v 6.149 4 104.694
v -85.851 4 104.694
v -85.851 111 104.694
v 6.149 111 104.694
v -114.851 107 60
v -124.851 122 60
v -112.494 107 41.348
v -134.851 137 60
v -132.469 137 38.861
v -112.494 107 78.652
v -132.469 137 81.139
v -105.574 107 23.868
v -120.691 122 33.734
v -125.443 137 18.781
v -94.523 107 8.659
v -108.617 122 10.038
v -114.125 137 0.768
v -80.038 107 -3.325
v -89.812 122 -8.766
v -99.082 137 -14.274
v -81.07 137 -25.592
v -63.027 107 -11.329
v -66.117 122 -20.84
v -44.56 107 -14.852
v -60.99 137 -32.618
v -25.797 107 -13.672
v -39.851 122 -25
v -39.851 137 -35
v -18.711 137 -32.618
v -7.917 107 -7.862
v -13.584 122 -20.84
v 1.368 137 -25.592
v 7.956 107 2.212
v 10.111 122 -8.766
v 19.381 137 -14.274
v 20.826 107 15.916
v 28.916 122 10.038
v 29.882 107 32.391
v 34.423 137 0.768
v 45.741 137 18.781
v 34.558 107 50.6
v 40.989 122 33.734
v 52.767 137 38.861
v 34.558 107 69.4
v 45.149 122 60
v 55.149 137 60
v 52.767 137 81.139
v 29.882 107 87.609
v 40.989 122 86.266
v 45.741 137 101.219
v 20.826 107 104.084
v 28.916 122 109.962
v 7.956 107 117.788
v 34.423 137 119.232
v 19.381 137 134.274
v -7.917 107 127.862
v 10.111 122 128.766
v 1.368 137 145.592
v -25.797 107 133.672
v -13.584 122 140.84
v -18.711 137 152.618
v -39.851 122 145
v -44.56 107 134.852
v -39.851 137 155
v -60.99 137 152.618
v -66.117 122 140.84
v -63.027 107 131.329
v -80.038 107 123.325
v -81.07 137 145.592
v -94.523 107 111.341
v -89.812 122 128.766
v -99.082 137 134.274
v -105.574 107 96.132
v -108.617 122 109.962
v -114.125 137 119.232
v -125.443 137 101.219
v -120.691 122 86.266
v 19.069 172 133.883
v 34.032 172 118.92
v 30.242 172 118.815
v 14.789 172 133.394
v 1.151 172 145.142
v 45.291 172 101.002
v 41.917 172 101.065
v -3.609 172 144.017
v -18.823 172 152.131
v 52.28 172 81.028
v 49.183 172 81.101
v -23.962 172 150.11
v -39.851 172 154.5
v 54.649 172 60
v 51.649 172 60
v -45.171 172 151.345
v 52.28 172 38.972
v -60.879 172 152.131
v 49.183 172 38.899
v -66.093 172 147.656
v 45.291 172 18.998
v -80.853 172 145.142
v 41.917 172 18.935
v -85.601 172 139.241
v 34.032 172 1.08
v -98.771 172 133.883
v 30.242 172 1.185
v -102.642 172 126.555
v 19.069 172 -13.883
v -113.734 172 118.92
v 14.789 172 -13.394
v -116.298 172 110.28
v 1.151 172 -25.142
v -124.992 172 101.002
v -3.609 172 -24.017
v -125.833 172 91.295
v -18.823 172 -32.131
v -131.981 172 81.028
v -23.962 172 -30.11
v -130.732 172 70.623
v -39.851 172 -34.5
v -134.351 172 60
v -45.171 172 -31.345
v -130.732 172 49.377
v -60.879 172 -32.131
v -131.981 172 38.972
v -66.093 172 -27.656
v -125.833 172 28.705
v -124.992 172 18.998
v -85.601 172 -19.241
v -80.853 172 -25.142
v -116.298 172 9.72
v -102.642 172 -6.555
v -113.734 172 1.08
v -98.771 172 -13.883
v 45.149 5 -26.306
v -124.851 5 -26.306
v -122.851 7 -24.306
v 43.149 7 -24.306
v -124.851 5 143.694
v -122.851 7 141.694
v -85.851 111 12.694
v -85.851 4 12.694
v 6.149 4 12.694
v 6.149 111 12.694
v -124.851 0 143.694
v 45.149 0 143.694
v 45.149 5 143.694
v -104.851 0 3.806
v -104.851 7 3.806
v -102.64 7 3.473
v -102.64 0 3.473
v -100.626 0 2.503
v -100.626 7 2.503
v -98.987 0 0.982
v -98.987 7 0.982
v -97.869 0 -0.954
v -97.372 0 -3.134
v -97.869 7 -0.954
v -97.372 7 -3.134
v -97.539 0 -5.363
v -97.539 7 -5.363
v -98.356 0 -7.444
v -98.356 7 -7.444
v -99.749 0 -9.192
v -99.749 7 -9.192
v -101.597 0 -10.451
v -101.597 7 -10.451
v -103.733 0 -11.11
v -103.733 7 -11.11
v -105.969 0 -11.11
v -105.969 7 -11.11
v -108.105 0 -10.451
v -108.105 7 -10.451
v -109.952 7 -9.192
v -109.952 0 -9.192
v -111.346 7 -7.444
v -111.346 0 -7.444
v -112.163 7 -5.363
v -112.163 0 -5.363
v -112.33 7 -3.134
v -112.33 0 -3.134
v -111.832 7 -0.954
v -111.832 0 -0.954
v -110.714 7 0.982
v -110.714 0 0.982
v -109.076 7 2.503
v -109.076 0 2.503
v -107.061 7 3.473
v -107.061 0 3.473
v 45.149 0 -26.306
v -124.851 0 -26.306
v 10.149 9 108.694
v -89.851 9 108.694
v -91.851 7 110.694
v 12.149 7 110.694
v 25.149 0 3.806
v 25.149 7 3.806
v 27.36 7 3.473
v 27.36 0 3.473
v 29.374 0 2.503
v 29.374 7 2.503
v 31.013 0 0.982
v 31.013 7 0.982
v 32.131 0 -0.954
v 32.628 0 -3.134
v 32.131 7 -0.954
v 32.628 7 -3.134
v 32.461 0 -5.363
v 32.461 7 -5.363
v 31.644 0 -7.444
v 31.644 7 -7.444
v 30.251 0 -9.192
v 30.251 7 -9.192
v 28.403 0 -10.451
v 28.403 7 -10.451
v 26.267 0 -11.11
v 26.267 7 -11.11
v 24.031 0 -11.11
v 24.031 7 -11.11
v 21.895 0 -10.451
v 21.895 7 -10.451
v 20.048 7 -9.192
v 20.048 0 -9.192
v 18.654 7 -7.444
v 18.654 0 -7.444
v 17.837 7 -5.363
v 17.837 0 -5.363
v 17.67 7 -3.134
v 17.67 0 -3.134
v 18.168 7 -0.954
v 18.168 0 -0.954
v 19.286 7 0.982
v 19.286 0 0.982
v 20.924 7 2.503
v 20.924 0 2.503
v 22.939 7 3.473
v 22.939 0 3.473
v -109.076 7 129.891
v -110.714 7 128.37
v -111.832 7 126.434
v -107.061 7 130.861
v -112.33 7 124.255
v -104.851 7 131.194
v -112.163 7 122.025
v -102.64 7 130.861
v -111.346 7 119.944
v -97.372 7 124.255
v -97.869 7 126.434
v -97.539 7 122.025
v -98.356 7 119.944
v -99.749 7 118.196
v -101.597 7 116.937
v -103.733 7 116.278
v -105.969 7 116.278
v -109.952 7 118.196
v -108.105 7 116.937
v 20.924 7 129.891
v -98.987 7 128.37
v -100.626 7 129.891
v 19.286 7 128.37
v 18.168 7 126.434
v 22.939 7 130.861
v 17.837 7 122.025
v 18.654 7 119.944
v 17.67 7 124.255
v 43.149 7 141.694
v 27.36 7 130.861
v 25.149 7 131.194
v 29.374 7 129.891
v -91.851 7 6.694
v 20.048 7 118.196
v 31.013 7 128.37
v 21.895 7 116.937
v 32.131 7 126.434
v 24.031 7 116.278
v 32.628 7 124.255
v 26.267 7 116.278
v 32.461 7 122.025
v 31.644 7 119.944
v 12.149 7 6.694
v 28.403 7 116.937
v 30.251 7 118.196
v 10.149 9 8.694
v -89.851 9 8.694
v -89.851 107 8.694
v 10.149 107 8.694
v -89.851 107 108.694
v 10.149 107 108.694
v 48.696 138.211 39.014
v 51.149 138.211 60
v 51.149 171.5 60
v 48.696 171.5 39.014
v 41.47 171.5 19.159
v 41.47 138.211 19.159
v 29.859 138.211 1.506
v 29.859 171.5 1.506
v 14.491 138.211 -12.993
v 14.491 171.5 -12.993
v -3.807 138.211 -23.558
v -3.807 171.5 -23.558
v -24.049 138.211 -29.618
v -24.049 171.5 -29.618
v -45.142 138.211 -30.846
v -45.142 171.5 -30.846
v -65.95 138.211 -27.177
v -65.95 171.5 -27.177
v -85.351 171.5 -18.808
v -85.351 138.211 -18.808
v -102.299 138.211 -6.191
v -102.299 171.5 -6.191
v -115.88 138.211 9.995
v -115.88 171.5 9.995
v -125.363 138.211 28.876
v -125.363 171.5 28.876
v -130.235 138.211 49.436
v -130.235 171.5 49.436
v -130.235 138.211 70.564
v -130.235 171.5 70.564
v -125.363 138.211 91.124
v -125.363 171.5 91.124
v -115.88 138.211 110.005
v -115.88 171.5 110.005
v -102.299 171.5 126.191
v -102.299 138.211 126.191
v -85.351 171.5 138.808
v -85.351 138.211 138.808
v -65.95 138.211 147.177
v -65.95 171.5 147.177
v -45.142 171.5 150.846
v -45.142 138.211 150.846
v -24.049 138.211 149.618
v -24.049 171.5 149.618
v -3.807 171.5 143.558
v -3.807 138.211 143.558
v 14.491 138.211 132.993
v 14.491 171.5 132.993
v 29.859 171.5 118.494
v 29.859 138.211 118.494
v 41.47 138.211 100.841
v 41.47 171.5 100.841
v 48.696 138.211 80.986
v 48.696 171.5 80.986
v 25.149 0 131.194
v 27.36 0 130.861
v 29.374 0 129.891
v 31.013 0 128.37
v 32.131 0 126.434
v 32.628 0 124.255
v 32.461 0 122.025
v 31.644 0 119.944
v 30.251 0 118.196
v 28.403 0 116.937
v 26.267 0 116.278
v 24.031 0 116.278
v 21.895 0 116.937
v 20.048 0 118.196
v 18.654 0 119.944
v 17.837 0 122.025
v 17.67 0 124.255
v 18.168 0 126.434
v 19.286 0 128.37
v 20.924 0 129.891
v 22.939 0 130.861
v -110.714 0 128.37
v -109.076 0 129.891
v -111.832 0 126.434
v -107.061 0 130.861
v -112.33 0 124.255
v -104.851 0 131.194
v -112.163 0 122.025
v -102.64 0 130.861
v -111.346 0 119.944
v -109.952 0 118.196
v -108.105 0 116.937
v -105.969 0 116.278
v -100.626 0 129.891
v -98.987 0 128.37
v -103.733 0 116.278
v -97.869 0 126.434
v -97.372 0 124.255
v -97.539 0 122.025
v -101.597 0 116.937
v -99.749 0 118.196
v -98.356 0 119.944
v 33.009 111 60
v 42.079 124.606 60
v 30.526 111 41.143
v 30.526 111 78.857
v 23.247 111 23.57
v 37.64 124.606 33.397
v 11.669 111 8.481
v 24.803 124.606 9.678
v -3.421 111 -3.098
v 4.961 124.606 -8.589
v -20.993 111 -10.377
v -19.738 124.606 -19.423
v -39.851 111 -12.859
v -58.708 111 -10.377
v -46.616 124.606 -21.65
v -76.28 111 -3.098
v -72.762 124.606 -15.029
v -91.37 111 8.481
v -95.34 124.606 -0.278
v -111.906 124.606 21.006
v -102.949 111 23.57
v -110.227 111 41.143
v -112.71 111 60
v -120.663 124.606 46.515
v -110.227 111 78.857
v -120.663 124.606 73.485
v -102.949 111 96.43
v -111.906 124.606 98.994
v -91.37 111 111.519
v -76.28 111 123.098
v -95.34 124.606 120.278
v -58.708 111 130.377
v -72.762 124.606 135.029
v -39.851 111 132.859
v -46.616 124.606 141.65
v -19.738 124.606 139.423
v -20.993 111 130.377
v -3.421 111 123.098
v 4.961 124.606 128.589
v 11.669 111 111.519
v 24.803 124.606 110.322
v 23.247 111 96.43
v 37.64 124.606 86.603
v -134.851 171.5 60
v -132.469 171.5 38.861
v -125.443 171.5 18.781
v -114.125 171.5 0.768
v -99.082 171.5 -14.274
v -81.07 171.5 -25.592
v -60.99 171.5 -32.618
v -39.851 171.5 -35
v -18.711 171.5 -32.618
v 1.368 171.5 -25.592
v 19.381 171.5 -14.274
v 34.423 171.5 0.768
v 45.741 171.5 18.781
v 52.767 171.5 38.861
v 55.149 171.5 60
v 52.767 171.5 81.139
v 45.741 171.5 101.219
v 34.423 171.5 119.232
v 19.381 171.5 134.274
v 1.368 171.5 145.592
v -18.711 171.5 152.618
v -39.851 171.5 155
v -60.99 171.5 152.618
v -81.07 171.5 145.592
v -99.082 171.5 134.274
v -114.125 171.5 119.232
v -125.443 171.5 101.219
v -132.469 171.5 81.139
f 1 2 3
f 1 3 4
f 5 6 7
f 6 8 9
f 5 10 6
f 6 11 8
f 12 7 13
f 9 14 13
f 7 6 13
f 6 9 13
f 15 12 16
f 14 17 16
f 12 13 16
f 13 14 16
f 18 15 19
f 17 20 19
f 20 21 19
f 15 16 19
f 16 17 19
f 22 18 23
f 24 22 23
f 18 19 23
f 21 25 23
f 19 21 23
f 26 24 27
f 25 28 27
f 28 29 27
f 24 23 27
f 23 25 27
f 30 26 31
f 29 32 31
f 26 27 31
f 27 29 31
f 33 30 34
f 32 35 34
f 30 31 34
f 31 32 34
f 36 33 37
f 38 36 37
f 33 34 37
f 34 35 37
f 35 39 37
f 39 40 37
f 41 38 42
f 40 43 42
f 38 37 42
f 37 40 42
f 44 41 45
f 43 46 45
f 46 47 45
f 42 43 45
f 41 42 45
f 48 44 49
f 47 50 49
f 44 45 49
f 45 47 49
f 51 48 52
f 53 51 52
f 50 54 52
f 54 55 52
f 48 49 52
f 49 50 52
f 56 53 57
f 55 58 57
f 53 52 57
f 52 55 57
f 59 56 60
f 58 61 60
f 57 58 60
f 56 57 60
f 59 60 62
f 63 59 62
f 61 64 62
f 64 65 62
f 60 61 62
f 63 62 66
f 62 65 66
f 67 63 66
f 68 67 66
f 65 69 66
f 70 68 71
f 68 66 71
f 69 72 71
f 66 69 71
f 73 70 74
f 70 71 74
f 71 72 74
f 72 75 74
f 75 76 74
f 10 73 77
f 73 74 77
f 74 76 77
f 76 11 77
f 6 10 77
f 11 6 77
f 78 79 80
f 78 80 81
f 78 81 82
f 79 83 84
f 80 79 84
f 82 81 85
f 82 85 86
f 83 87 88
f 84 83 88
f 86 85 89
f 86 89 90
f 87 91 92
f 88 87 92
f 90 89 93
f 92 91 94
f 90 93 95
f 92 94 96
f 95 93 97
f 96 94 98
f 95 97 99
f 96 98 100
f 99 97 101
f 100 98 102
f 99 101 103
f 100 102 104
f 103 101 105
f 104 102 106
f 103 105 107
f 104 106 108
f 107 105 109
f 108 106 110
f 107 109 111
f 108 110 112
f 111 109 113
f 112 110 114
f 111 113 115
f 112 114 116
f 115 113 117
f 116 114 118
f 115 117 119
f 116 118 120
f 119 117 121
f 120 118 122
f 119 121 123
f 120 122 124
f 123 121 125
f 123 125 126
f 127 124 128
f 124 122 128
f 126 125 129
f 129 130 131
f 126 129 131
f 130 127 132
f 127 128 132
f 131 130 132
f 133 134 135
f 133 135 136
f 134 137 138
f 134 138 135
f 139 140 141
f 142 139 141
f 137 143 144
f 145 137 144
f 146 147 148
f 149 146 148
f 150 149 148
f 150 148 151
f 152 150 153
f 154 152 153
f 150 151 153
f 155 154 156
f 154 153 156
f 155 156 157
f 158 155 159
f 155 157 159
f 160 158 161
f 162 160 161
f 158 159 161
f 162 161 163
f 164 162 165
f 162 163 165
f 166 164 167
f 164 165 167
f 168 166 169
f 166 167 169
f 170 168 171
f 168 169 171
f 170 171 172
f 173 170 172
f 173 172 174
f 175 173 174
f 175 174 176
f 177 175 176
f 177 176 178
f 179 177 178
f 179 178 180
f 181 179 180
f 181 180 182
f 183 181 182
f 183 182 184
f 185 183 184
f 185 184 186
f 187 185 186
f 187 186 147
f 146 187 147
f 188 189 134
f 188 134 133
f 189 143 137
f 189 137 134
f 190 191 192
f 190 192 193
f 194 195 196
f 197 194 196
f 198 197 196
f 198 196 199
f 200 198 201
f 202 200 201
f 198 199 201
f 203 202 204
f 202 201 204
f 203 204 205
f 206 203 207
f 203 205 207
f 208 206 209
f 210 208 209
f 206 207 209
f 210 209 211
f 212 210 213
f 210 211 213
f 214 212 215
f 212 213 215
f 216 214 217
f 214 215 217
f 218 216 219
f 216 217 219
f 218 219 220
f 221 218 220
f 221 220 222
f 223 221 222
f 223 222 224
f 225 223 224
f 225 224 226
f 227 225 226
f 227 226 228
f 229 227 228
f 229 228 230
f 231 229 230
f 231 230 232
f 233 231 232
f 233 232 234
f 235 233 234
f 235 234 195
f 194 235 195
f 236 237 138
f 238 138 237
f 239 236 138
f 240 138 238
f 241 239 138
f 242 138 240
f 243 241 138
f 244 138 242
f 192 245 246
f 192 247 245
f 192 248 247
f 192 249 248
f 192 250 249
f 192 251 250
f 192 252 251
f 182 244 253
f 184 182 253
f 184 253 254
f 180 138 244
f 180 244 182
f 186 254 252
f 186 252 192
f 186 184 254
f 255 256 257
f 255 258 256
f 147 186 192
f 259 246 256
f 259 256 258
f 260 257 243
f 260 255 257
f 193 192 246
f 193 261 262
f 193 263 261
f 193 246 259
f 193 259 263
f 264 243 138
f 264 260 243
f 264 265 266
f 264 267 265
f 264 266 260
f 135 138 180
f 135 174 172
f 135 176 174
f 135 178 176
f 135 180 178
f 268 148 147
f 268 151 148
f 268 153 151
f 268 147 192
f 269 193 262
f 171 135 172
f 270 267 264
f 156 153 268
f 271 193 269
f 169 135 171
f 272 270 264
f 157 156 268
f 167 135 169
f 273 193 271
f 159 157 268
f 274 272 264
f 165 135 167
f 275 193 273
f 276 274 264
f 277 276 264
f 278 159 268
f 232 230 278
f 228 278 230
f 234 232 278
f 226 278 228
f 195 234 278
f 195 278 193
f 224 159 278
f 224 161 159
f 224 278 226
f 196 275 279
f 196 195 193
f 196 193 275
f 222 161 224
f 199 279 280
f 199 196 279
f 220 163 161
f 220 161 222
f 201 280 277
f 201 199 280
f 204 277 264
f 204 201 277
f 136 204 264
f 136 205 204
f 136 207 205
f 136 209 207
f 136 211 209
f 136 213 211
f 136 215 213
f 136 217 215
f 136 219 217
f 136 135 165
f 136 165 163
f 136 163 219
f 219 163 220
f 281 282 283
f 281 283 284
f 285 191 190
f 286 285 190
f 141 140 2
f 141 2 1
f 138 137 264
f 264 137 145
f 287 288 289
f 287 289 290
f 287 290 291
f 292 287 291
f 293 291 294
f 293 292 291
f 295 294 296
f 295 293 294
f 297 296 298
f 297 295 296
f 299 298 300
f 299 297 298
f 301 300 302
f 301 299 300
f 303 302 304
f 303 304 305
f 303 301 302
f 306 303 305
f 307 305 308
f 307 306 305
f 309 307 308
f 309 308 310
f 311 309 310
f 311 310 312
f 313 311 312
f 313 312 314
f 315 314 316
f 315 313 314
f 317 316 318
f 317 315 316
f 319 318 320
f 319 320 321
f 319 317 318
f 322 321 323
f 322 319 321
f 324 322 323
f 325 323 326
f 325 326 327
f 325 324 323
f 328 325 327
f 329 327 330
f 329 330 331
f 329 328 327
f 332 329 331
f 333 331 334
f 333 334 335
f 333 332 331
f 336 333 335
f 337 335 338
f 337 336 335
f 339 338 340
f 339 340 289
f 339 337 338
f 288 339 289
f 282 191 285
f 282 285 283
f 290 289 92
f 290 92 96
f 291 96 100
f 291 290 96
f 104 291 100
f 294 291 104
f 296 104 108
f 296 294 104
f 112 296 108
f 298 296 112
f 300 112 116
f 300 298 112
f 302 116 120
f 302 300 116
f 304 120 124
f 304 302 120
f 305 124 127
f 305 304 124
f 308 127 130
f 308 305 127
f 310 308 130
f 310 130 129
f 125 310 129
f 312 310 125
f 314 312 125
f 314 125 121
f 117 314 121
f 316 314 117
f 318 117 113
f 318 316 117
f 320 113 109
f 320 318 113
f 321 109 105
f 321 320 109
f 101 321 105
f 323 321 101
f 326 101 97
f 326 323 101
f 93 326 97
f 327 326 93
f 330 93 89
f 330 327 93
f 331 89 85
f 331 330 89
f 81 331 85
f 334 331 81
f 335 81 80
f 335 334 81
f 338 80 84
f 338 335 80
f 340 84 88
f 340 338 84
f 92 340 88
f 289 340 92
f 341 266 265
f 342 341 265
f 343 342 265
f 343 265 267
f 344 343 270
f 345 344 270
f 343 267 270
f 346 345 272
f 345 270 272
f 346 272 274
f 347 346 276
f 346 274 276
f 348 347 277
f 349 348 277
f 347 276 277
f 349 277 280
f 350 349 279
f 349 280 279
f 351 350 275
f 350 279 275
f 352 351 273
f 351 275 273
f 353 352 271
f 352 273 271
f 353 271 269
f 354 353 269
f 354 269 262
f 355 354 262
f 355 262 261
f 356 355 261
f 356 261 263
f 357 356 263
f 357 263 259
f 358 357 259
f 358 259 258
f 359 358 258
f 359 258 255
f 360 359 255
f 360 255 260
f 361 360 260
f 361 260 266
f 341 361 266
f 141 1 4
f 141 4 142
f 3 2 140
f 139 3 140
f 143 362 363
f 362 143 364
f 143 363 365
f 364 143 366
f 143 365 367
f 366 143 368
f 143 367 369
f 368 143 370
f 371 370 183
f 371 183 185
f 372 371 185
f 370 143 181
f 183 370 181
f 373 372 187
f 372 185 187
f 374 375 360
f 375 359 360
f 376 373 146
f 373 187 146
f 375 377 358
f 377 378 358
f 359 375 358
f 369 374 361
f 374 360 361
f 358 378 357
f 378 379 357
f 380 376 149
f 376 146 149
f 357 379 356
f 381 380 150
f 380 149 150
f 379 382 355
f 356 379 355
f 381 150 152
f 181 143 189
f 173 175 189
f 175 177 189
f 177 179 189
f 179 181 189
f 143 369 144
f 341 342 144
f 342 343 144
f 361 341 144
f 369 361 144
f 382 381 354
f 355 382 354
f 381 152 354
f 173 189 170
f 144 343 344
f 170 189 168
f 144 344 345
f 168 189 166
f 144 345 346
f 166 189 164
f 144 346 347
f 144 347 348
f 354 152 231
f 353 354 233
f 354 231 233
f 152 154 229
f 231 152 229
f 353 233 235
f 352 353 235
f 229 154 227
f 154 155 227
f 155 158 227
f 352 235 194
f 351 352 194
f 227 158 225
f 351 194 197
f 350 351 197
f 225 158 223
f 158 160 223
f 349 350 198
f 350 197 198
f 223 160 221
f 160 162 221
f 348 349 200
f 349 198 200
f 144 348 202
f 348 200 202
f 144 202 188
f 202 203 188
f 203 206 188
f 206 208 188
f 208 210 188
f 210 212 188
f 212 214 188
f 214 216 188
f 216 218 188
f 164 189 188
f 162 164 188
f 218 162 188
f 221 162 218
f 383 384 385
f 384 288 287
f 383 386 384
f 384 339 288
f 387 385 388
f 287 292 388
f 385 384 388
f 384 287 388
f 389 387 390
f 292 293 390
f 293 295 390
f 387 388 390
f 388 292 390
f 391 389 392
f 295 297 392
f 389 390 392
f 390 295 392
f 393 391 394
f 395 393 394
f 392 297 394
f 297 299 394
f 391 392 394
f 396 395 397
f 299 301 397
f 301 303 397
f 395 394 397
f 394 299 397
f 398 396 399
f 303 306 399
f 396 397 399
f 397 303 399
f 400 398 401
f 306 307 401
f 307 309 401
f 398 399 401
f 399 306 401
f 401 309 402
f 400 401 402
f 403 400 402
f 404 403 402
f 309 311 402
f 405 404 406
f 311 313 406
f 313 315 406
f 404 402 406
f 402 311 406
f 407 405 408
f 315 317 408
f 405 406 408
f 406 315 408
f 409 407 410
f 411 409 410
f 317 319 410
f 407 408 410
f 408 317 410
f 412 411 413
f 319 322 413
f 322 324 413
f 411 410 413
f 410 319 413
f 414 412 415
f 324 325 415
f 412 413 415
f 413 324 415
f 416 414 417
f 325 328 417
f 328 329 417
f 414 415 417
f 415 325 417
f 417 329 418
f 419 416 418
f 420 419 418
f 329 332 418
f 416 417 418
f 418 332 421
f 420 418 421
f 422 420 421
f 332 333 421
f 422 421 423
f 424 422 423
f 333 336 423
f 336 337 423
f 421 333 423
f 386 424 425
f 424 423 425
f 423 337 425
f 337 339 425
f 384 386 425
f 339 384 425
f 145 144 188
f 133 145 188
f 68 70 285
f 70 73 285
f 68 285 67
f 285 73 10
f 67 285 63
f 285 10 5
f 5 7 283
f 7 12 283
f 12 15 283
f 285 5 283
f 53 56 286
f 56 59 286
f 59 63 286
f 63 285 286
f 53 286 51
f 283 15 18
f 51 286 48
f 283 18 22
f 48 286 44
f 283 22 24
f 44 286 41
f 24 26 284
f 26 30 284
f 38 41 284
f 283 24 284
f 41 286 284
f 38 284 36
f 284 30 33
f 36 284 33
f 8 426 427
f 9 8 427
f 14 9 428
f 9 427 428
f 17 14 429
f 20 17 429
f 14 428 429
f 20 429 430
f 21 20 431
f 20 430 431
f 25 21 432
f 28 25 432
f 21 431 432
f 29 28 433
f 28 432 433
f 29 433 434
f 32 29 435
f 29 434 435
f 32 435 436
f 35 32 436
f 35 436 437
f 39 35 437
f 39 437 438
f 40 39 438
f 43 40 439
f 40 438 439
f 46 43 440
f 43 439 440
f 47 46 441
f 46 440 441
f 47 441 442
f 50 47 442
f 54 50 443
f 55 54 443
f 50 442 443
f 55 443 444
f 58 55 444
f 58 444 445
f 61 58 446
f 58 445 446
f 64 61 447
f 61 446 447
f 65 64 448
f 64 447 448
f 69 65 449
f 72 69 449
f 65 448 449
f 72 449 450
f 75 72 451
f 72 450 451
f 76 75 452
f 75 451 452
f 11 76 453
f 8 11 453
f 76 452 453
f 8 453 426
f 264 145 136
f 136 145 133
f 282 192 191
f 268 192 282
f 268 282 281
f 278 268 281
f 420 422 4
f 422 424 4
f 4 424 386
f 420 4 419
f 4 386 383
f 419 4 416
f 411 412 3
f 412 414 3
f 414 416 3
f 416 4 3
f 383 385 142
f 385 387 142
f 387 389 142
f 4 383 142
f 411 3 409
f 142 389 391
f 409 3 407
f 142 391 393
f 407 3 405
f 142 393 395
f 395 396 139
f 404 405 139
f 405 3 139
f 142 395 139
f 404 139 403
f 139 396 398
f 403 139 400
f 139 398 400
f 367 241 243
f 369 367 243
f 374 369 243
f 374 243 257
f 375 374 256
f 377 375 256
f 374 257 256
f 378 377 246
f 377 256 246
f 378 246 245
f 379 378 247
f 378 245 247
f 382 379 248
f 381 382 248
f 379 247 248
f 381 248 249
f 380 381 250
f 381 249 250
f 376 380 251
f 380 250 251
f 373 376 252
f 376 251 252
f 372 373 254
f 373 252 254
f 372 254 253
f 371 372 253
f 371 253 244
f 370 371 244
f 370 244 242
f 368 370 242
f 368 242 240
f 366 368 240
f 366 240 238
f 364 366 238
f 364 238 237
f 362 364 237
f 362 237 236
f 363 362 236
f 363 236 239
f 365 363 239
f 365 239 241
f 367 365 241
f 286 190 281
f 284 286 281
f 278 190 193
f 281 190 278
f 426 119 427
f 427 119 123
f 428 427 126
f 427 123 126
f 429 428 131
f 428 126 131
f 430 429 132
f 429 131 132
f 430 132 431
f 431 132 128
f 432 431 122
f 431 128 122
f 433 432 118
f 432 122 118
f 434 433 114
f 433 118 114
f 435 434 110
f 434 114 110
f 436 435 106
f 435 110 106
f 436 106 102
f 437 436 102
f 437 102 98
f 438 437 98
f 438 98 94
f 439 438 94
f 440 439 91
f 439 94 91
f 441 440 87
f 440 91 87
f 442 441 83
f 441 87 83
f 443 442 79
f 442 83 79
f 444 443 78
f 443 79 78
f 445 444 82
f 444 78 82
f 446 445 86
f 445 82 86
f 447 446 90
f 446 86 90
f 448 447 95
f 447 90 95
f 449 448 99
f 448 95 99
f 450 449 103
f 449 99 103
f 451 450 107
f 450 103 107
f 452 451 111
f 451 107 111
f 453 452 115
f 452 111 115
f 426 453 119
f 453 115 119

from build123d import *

# Parameters (mm, degrees)
ESQUISSE1_W             = 170
ESQUISSE1_H             = 170
BOSS_EXTRU_1_DEPTH      = 7
ESQUISSE2_W             = 100
ESQUISSE2_H             = 100
BOSS_EXTRU_2_DEPTH      = 100
COQUE1_START            = 4
COQUE1_OUTLINE_W        = 92
COQUE1_OUTLINE_H        = 92
COQUE1_DEPTH            = 168
COQUE1_START_2          = 138.211102451
COQUE1_2_OUTLINE_R      = 91
COQUE1_2_OUTLINE_W      = 92
COQUE1_2_OUTLINE_H      = 92
COQUE1_2_DEPTH          = 33.788897549
CHANFREIN1_SIZE         = 2
CHANFREIN2_SIZE         = 0.5
ESQUISSE4_R             = 7.5
ENL_V_MAT_EXTRU_1_DEPTH = 70


with BuildPart() as part:
    # Esquisse1 → Boss.-Extru.1 (new body)
    with BuildSketch(Plane(origin=(0, 0, 0), x_dir=(1, 0, 0), z_dir=(0, 1, 0))):
        with Locations((-39.850746269, -58.694029851)):
            Rectangle(ESQUISSE1_W, ESQUISSE1_H)
    extrude(amount=BOSS_EXTRU_1_DEPTH)

    # Esquisse2 → Boss.-Extru.2 (add)
    with BuildSketch(Plane(origin=(0, 7, 0), x_dir=(1, 0, 0), z_dir=(0, 1, 0))):
        with Locations((-39.850746269, -58.694029851)):
            Rectangle(ESQUISSE2_W, ESQUISSE2_H)
    extrude(amount=BOSS_EXTRU_2_DEPTH)

    # Esquisse3 → Révolution1 (revolve)
    with BuildSketch(Plane.XY.offset(60), mode=Mode.PRIVATE) as r_volution1_sk:
        Polygon((55.149253731, 137), (55.149253731, 172), (-39.850746269, 172), (-39.850746269, 107), (35.149253731, 107), align=None)
    revolve(r_volution1_sk.sketch.rotate(Axis((-39.850746269, 172, 60), (0, -1, 0)), 180), axis=Axis((-39.850746269, 172, 60), (0, -1, 0)))

    # Coque1: read off the stored shape, not the designer's step
    # Coque1 outline → Coque1 (cut)
    with BuildSketch(Plane(origin=(0, 0, 0), x_dir=(1, 0, 0), z_dir=(0, 1, 0)).offset(COQUE1_START)):
        with Locations((-39.850746269, -58.694029851)):
            Rectangle(COQUE1_OUTLINE_W, COQUE1_OUTLINE_H)
    extrude(amount=COQUE1_DEPTH, mode=Mode.SUBTRACT)

    # Coque1 2 outline → Coque1 2 (cut)
    with BuildSketch(Plane(origin=(0, 0, 0), x_dir=(1, 0, 0), z_dir=(0, 1, 0)).offset(COQUE1_START_2)):
        with Locations((-39.850746269, -60)):
            Circle(COQUE1_2_OUTLINE_R)
        with Locations((-39.850746269, -58.694029851)):
            Rectangle(COQUE1_2_OUTLINE_W, COQUE1_2_OUTLINE_H, mode=Mode.SUBTRACT)
    extrude(amount=COQUE1_2_DEPTH, mode=Mode.SUBTRACT)

    # Coque1 3 outline → Coque1 3 (revolve, cut)
    with BuildSketch(Plane(origin=(-39.850746269, 0, 60), x_dir=(1, 0, 0), z_dir=(0, 0, 1))):
        Polygon((44.694029851, 138.211102551), (44.694029851, 111), (72.859264966, 111), (91, 138.211102551), align=None)
    revolve(axis=Axis((-39.850746269, 0, 60), (0, 1, 0)), mode=Mode.SUBTRACT)

    # Chanfrein1
    chanfrein1_edges = [part.edges().sort_by_distance(p)[0] for p in [
        (45.149253731, 7, 58.694029851),
        (-89.850746269, 7, 58.694029851),
        (-39.850746269, 7, 108.694029851),
        (10.149253731, 7, 58.694029851),
        (-39.850746269, 7, 8.694029851),
        (-39.850746269, 7, -26.305970149),
        (-124.850746269, 7, 58.694029851),
        (-39.850746269, 7, 143.694029851),
    ]]
    chamfer(chanfrein1_edges, length=CHANFREIN1_SIZE)

    # Chanfrein2
    chanfrein2_edges = [part.edges().sort_by_distance(p)[0] for p in [
        (55.149253731, 172, 60),
        (-130.850746269, 172, 60),
    ]]
    chamfer(chanfrein2_edges, length=CHANFREIN2_SIZE)

    # Esquisse4 → Enlèv. mat.-Extru.1 (cut)
    with BuildSketch(Plane(origin=(0, 7, 0), x_dir=(1, 0, 0), z_dir=(0, 1, 0))):
        with Locations(Location((25.149253731, -123.694029851, 0), (0, 0, 270))):
            Circle(ESQUISSE4_R)
        with Locations(Location((25.149253731, 3.694029851, 0), (0, 0, 270))):
            Circle(ESQUISSE4_R)
        with Locations(Location((-104.850746269, -123.694029851, 0), (0, 0, 270))):
            Circle(ESQUISSE4_R)
        with Locations(Location((-104.850746269, 3.694029851, 0), (0, 0, 270))):
            Circle(ESQUISSE4_R)
    extrude(amount=-ENL_V_MAT_EXTRU_1_DEPTH, mode=Mode.SUBTRACT)


solid = part.part
